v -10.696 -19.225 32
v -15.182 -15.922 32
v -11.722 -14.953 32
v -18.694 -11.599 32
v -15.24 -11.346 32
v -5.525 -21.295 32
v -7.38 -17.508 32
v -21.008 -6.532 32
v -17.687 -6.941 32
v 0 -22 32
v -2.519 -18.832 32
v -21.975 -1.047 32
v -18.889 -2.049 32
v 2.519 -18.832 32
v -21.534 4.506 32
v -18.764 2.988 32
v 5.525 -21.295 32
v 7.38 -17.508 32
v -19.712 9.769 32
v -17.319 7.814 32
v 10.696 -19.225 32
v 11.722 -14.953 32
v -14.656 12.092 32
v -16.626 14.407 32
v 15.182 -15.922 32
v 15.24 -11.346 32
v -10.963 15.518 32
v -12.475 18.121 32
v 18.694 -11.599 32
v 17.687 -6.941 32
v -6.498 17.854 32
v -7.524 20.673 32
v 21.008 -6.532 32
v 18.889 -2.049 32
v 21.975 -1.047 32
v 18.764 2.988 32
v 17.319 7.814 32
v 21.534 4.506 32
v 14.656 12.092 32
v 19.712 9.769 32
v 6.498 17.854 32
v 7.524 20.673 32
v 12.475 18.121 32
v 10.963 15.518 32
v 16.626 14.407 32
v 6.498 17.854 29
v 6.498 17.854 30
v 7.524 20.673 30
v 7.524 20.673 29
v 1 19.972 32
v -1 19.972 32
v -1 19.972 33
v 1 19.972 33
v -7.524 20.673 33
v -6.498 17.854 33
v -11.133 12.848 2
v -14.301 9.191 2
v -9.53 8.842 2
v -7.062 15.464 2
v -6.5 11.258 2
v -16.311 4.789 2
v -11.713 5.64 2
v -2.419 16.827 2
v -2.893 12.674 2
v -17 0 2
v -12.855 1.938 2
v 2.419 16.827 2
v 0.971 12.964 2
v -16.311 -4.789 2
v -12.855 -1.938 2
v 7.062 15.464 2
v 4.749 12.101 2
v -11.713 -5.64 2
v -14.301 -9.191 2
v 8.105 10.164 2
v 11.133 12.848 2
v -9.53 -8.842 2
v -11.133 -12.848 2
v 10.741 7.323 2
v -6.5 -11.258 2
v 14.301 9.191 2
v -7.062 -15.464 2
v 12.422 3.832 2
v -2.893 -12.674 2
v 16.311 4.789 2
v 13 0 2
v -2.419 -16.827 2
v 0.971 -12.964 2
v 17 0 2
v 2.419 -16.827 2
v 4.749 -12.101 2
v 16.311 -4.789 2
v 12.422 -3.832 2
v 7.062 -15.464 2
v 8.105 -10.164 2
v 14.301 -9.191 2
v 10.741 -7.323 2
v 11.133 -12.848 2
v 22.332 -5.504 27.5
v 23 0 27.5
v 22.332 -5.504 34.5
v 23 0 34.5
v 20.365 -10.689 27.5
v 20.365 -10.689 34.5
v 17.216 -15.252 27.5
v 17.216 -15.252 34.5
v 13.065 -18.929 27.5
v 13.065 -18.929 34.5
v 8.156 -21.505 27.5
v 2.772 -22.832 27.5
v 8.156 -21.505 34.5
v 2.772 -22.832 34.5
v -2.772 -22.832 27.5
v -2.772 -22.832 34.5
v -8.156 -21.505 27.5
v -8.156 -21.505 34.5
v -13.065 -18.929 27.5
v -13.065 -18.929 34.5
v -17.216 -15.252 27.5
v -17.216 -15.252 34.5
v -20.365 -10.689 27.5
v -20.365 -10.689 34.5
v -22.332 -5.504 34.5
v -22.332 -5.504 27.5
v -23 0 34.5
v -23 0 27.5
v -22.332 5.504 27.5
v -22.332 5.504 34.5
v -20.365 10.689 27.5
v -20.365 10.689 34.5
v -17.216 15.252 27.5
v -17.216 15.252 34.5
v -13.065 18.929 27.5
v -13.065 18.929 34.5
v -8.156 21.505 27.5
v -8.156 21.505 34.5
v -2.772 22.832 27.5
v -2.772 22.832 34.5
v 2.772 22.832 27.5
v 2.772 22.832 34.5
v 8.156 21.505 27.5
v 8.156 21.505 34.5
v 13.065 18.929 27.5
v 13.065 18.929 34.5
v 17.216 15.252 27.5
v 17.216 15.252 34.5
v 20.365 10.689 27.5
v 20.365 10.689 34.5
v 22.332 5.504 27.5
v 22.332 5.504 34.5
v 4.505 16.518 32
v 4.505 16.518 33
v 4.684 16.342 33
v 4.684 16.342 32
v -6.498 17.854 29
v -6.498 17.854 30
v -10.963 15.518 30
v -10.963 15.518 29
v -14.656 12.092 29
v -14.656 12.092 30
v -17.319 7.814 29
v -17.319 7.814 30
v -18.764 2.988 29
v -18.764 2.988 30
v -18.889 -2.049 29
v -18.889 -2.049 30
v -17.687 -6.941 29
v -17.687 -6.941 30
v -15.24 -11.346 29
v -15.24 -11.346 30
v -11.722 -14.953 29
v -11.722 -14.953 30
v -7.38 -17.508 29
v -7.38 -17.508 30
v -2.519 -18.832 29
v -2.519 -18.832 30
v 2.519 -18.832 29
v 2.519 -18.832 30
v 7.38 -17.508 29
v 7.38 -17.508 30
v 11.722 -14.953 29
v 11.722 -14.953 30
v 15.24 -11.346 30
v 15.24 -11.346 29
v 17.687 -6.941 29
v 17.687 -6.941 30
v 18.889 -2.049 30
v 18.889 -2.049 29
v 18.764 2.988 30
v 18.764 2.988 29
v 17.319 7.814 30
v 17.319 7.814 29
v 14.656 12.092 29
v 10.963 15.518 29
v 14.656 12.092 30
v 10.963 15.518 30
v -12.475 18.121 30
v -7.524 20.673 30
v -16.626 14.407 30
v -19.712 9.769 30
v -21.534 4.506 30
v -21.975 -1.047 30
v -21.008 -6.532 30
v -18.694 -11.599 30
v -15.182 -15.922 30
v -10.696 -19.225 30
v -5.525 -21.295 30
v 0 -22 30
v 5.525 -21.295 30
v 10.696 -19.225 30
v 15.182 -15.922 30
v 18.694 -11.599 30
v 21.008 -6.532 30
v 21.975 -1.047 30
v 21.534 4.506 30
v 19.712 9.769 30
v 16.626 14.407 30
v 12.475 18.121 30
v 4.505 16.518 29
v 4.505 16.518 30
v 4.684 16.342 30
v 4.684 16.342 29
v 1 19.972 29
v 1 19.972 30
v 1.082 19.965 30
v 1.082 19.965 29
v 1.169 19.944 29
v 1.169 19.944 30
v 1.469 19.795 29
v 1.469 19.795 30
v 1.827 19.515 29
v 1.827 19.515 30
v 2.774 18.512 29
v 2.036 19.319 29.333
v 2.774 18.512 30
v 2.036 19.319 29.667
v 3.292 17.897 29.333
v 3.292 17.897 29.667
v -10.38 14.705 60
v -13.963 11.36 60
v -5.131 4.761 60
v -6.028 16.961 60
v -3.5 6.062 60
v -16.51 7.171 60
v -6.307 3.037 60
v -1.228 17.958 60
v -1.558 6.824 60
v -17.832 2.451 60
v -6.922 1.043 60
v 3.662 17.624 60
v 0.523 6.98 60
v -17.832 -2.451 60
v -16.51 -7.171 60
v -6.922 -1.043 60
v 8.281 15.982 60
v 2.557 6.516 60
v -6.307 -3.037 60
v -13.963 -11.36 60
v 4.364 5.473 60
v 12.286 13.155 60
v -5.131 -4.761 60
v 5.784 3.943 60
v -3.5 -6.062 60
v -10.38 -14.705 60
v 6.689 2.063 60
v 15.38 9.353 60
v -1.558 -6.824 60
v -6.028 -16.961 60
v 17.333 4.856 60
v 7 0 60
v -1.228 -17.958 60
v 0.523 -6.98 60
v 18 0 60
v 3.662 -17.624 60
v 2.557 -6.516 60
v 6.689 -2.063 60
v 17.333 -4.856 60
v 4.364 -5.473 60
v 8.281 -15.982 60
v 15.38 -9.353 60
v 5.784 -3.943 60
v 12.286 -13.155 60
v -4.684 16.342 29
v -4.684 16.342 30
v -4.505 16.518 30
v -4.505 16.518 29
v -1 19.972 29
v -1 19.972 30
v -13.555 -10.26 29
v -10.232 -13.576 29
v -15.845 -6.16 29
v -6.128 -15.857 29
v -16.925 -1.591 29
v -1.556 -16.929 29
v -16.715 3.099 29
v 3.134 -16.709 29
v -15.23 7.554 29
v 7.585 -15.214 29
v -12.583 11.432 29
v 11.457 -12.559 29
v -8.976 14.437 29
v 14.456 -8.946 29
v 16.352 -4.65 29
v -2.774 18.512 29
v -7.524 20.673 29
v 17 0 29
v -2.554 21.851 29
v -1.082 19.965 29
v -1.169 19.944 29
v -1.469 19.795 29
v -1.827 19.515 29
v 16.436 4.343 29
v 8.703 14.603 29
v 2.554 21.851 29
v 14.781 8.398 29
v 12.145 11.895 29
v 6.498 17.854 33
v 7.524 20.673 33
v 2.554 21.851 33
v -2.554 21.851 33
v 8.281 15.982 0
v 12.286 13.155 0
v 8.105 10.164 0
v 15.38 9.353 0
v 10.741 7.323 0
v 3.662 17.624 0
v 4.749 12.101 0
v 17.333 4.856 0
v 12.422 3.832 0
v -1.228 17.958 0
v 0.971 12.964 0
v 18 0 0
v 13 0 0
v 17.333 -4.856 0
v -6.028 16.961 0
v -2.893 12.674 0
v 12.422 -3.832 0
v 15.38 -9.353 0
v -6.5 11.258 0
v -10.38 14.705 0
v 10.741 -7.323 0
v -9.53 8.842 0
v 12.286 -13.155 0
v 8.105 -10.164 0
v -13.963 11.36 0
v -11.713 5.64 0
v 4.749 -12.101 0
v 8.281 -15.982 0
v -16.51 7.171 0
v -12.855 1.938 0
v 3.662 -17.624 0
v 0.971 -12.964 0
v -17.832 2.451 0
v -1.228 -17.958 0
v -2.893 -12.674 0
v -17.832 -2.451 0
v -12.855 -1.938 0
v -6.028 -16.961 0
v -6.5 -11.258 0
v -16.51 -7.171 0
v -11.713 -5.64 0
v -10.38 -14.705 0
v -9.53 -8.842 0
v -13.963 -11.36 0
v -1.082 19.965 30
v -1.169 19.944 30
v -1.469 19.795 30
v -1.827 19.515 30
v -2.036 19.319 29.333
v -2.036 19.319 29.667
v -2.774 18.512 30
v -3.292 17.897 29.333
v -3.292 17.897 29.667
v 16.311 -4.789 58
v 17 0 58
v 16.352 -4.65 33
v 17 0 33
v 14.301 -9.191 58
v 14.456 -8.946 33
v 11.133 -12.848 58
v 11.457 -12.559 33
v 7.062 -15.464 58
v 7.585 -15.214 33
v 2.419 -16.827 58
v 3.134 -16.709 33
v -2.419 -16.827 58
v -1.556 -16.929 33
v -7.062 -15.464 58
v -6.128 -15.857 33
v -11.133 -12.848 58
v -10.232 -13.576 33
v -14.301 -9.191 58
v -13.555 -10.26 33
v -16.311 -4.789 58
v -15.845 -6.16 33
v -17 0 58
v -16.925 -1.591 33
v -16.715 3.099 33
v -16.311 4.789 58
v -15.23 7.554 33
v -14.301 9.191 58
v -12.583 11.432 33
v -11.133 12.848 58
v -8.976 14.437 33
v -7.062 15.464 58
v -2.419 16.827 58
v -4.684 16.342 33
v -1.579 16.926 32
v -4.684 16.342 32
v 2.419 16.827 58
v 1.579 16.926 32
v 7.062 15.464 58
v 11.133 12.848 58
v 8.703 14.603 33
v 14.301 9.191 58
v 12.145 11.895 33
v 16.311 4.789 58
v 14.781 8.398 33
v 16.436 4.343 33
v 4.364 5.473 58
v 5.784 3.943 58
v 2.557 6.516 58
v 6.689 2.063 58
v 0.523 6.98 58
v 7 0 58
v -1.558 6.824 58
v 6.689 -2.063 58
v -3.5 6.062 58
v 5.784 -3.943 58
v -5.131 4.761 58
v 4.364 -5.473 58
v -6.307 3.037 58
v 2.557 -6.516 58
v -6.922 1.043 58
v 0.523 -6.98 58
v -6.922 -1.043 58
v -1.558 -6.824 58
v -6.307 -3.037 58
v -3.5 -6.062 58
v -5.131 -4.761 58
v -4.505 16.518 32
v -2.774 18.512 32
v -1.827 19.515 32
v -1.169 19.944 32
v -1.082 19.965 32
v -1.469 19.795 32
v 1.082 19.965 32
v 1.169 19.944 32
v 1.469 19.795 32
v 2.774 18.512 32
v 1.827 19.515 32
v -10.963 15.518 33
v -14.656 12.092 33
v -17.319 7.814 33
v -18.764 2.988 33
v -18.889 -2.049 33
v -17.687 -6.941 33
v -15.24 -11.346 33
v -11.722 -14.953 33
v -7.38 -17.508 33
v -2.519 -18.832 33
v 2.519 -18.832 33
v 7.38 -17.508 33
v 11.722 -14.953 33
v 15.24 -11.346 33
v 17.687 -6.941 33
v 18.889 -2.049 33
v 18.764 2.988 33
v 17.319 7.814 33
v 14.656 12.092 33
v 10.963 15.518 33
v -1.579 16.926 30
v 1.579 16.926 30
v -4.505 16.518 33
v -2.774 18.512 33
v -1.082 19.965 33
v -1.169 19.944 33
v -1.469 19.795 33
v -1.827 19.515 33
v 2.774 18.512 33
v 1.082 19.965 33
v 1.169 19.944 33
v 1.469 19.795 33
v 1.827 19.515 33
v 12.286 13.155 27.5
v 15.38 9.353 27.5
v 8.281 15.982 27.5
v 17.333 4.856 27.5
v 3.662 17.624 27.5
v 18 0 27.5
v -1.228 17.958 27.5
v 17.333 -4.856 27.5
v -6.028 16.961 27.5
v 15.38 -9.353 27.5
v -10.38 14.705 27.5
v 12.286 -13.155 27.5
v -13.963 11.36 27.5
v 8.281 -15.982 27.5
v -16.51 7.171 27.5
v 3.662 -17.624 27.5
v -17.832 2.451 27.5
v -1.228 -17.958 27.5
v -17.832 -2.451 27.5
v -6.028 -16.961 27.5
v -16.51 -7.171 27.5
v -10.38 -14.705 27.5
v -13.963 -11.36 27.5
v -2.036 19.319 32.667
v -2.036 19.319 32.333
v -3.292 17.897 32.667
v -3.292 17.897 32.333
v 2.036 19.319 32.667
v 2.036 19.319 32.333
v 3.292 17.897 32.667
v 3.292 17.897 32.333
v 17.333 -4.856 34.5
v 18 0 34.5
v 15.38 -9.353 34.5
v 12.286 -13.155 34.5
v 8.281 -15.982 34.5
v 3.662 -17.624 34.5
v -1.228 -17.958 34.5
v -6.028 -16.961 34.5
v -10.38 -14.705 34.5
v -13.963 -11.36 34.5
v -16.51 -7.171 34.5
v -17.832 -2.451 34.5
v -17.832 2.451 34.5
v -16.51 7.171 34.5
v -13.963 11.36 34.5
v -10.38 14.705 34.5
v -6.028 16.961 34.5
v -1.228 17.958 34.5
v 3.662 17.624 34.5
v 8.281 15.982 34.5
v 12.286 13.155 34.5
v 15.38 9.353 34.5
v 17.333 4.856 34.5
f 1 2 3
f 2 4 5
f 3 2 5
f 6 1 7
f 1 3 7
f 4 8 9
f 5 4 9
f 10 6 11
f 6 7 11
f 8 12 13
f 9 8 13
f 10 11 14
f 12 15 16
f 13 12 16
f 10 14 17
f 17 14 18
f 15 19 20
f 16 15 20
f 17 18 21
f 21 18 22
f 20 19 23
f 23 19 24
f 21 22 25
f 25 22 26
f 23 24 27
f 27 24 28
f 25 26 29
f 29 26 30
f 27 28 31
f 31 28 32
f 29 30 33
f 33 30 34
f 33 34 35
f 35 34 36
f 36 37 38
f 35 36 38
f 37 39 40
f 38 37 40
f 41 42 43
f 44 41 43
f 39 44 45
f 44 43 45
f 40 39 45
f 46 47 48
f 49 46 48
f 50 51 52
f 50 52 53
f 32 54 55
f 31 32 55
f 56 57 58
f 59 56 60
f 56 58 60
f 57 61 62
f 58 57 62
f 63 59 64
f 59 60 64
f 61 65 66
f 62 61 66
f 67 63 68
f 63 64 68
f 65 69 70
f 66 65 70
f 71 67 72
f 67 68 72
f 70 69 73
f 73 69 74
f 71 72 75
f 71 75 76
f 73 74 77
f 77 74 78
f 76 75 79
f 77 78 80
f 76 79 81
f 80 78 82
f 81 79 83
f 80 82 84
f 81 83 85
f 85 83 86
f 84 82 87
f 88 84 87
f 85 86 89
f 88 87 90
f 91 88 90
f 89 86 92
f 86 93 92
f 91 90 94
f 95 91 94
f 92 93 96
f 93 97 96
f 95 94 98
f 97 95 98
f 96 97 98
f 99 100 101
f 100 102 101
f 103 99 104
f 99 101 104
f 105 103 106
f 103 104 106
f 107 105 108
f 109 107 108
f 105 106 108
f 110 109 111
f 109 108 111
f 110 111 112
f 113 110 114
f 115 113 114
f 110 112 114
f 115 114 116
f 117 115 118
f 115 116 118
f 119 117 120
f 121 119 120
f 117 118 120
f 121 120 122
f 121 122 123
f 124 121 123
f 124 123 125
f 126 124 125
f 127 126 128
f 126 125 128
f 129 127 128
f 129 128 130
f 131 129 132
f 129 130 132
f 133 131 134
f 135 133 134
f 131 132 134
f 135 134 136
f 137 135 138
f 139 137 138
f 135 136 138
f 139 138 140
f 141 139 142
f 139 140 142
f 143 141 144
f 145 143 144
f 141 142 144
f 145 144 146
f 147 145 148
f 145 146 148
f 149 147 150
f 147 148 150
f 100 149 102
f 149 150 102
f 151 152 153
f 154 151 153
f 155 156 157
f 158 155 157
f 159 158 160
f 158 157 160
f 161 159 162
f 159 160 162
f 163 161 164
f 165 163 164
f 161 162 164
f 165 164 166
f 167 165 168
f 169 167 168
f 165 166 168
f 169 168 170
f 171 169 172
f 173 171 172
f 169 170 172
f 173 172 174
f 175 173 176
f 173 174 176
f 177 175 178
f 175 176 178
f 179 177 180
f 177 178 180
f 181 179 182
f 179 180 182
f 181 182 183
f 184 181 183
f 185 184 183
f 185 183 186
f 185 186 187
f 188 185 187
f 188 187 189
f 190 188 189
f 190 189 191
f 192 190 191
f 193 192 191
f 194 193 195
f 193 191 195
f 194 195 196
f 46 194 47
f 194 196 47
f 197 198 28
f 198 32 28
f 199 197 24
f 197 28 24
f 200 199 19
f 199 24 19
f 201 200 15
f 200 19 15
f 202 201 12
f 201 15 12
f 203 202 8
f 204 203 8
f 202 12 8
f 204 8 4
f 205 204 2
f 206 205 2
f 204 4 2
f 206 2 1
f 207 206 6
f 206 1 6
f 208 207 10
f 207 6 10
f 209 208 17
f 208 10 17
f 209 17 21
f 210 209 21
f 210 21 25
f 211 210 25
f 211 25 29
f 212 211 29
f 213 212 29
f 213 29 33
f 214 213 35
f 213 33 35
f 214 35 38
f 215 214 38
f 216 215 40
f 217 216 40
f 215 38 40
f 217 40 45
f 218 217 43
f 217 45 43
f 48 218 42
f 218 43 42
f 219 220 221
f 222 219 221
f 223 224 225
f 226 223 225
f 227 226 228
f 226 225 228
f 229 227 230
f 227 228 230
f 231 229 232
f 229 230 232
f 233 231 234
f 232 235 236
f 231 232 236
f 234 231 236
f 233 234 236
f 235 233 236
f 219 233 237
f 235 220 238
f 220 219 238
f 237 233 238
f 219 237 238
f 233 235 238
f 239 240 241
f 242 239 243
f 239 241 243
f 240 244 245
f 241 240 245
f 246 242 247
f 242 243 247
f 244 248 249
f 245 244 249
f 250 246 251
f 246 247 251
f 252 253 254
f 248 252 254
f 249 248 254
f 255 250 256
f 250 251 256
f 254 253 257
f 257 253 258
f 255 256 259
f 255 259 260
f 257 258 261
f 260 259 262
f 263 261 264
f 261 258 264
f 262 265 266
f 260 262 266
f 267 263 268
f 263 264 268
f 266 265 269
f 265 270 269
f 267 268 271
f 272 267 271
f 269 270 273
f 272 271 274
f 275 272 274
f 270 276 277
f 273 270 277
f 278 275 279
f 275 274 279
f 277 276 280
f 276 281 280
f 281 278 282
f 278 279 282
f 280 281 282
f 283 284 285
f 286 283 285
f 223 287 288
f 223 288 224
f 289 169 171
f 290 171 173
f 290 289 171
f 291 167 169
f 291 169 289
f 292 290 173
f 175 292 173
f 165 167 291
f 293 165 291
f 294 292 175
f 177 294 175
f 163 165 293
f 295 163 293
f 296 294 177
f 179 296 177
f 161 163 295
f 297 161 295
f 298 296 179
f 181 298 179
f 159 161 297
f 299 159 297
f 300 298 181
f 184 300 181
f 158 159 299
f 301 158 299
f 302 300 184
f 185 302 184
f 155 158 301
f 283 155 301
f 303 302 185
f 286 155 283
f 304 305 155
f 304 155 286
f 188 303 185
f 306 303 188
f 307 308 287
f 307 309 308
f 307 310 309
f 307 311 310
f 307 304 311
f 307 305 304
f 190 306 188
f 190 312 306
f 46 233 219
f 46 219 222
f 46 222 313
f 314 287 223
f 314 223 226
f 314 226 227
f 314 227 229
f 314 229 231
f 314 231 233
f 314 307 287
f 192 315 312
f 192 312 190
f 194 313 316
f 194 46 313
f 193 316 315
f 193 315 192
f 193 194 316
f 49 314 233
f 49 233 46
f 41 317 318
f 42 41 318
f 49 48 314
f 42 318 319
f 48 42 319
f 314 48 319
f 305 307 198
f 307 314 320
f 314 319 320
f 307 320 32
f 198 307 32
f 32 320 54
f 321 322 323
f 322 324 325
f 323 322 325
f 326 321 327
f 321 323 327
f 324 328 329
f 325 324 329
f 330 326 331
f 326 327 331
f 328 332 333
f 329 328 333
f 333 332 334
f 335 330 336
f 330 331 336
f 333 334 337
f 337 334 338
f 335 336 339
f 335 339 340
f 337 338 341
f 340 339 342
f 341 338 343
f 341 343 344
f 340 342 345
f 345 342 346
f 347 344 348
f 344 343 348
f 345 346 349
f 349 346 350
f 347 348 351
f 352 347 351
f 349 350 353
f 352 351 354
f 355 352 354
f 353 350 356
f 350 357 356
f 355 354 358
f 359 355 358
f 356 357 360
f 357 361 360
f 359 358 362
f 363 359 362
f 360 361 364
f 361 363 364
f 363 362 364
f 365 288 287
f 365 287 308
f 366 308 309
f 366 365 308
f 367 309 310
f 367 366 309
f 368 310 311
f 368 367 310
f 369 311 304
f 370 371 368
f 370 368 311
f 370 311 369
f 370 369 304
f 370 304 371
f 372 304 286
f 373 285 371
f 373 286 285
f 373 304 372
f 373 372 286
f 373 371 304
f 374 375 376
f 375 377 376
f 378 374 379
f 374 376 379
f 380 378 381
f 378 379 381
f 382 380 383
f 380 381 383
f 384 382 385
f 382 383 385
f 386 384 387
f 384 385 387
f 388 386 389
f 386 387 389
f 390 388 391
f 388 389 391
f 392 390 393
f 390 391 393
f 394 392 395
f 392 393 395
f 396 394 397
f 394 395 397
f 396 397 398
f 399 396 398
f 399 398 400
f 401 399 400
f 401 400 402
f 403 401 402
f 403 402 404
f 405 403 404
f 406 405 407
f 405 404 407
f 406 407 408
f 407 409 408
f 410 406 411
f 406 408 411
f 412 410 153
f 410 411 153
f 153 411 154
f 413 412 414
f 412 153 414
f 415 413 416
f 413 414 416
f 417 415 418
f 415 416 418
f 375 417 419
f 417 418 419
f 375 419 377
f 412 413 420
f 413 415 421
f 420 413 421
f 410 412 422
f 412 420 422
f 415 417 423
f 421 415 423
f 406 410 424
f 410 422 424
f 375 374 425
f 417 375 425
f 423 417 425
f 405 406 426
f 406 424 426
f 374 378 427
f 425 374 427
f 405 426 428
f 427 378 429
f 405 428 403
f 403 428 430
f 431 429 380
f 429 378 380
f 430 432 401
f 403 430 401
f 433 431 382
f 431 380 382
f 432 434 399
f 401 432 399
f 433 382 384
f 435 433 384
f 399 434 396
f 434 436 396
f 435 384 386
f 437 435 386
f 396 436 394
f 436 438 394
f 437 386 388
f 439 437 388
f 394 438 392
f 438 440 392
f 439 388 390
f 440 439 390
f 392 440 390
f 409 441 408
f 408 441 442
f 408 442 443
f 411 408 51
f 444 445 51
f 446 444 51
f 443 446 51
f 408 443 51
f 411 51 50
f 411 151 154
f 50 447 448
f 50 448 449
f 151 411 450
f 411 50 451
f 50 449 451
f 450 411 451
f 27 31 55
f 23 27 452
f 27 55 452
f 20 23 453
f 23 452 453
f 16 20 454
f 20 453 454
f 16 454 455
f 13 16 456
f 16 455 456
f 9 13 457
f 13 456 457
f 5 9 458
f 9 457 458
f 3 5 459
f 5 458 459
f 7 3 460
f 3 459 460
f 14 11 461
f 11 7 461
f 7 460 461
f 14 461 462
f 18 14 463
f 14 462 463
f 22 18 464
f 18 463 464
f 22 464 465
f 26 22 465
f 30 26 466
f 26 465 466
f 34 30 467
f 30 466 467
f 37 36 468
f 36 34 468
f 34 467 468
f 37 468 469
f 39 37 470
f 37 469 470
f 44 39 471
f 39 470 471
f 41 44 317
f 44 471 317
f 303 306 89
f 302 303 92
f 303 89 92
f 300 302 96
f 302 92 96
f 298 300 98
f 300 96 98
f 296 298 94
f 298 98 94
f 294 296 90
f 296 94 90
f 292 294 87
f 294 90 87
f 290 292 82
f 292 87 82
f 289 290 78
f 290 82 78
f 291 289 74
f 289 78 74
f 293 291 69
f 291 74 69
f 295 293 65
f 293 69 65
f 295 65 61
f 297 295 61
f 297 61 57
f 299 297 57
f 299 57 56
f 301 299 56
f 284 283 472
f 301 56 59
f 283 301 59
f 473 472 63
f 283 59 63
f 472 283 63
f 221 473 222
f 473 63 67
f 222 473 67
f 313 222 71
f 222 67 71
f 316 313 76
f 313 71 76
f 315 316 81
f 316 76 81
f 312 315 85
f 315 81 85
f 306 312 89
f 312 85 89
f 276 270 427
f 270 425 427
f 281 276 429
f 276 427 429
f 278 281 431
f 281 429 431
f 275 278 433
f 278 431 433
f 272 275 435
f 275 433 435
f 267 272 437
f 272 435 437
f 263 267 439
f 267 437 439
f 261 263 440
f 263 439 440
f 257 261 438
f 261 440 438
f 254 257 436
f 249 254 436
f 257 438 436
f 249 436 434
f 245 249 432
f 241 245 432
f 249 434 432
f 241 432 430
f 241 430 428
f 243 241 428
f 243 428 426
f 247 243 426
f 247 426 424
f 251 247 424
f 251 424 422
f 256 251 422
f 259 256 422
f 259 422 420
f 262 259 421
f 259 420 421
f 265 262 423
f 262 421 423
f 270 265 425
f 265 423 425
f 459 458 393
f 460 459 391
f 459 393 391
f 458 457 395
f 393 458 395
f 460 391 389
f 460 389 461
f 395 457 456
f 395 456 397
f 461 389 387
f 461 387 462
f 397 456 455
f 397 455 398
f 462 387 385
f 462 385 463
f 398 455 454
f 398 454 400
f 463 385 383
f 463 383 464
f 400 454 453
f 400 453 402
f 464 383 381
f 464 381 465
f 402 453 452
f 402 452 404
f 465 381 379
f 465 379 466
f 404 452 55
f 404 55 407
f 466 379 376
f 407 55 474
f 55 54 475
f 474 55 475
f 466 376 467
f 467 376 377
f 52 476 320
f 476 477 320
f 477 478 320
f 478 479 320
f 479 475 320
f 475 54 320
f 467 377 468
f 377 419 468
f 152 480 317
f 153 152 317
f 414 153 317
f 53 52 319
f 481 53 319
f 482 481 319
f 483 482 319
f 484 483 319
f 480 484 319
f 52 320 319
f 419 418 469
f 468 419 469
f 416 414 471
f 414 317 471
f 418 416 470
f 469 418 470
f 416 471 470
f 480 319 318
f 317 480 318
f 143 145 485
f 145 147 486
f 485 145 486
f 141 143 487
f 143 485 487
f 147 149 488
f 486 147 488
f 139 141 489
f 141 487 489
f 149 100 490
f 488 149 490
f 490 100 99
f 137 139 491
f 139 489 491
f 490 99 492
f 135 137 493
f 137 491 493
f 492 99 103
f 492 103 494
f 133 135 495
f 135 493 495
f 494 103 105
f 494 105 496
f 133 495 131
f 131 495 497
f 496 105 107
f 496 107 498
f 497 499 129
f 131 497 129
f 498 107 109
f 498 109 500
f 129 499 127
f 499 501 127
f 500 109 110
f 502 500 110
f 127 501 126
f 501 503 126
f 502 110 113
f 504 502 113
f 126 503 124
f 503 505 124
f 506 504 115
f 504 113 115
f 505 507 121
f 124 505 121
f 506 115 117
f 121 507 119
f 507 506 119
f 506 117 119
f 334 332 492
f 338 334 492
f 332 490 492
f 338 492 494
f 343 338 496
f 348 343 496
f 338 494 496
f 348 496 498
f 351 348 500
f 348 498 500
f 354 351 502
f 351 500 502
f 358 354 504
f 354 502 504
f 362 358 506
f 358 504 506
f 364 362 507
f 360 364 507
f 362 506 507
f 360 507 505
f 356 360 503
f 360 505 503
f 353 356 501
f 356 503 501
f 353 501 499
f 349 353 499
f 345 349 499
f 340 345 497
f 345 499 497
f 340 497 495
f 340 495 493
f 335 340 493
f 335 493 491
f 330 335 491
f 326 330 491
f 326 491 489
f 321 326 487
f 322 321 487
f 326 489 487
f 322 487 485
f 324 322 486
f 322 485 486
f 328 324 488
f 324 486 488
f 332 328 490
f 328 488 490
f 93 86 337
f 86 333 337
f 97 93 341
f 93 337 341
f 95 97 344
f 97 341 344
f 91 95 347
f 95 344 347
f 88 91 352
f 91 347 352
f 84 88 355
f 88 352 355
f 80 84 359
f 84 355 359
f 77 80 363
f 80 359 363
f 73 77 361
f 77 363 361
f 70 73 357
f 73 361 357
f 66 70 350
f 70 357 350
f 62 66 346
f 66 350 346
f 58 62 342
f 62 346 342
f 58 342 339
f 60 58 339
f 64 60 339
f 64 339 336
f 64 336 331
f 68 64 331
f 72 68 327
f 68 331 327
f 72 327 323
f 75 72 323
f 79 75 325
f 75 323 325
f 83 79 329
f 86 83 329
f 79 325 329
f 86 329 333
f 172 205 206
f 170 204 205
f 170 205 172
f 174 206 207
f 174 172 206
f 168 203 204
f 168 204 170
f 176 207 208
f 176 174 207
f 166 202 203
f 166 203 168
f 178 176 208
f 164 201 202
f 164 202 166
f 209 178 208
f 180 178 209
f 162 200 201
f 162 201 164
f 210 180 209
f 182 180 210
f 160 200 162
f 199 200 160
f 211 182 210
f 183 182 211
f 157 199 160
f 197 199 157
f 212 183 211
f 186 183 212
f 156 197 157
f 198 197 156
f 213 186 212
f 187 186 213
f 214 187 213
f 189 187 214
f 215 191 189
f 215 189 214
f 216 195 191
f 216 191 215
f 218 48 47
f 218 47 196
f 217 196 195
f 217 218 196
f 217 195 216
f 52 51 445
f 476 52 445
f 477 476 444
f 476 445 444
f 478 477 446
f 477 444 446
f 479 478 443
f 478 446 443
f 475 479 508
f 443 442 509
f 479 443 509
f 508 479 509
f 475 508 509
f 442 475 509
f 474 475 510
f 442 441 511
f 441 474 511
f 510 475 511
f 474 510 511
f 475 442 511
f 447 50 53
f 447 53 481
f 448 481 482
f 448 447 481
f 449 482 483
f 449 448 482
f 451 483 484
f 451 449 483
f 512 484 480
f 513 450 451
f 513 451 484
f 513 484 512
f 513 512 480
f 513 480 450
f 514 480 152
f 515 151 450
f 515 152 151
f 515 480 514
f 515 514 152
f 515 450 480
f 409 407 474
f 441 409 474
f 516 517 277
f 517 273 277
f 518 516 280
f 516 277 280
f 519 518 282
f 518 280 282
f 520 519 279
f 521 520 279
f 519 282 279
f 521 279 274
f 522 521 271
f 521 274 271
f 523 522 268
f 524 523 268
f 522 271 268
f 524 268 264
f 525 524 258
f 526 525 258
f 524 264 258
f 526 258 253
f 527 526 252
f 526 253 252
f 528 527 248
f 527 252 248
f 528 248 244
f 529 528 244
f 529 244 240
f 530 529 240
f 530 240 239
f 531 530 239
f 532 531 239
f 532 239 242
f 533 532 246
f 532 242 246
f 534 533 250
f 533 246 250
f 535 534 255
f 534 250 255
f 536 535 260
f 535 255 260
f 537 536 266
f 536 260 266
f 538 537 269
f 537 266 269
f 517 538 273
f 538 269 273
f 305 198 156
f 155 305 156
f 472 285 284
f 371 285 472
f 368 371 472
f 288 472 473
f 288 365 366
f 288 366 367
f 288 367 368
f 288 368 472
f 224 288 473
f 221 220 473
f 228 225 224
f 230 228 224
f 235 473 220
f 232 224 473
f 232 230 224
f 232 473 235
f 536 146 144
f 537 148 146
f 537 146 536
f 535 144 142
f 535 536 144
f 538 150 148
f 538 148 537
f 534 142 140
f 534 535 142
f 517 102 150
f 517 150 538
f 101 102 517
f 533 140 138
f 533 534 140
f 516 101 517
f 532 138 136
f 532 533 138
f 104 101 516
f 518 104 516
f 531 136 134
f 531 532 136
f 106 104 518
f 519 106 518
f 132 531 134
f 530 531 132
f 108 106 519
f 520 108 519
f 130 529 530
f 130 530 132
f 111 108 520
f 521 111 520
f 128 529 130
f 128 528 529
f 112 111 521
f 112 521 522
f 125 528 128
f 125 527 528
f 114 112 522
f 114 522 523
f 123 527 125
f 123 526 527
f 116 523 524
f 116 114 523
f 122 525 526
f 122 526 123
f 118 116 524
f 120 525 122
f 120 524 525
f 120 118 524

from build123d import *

# Parameters (mm, degrees)
CUT_EXTRUDE1_DEPTH = 2
CUT_EXTRUDE2_DEPTH = 1


with BuildPart() as part:
    # Sketch1 → Revolve1 (revolve)
    with BuildSketch(Plane(origin=(0, 0, 0), x_dir=(0, 0, -1), z_dir=(1, 0, 0))):
        Polygon((-60, 18), (-60, 7), (-58, 7), (-58, 17), (-2, 17), (-2, 13), (0, 13), (0, 18), (-27.5, 18), (-27.5, 23), (-34.5, 23), (-34.5, 18), align=None)
    revolve(axis=Axis((0, 0, 1072.381477522), (0, 0, -1)))

    # Sketch3 → Cut-Extrude1 (cut, symmetric)
    with BuildSketch(Plane.XY.offset(31)):
        with BuildLine():
            ThreePointArc((-6.498382723, 17.854159795), (0, -19), (6.498382723, 17.854159795))
            Line((6.498382723, 17.854159795), (7.524443153, 20.673237657))
            ThreePointArc((7.524443153, 20.673237657), (0, 22), (-7.524443153, 20.673237657))
            Line((-7.524443153, 20.673237657), (-6.498382723, 17.854159795))
        make_face()
        with BuildLine():
            add(Edge.make_bspline(
                [(-1, 19.972475891), (-1.837517439, 19.972475891), (-3.400702548, 17.606617047), (-4.505243001, 16.51810785)],
                knots=[0, 0, 0, 0, 1, 1, 1, 1], degree=3))
            Line((-1, 19.972475891), (1, 19.972475891))
            add(Edge.make_bspline(
                [(1, 19.972475891), (1.837517439, 19.972475891), (3.400702548, 17.606617047), (4.505243001, 16.51810785)],
                knots=[0, 0, 0, 0, 1, 1, 1, 1], degree=3))
            Line((4.505243001, 16.51810785), (4.683957663, 16.341987046))
            ThreePointArc((4.683957663, 16.341987046), (13.576215973, 10.231635249), (17, 0))
            ThreePointArc((17, 0), (-10.231635249, -13.576215973), (-4.683957663, 16.341987046))
            Line((-4.683957663, 16.341987046), (-4.505243001, 16.51810785))
        make_face(mode=Mode.SUBTRACT)
    extrude(amount=CUT_EXTRUDE1_DEPTH, both=True, mode=Mode.SUBTRACT)

    # Sketch3<5> → Cut-Extrude2 (cut, symmetric)
    with BuildSketch(Plane.XY.offset(31)):
        with BuildLine():
            Line((1, 19.972475891), (-1, 19.972475891))
            add(Edge.make_bspline(
                [(-1, 19.972475891), (-1.837517439, 19.972475891), (-3.400702548, 17.606617047), (-4.505243001, 16.51810785)],
                knots=[0, 0, 0, 0, 1, 1, 1, 1], degree=3))
            Line((-4.505243001, 16.51810785), (-4.683957663, 16.341987046))
            ThreePointArc((-4.683957663, 16.341987046), (0, -17), (4.683957663, 16.341987046))
            Line((4.683957663, 16.341987046), (4.505243001, 16.51810785))
            add(Edge.make_bspline(
                [(1, 19.972475891), (1.837517439, 19.972475891), (3.400702548, 17.606617047), (4.505243001, 16.51810785)],
                knots=[0, 0, 0, 0, 1, 1, 1, 1], degree=3))
        make_face()
        with BuildLine():
            Line((7.524443153, 20.673237657), (6.498382723, 17.854159795))
            ThreePointArc((6.498382723, 17.854159795), (0, -19), (-6.498382723, 17.854159795))
            Line((-6.498382723, 17.854159795), (-7.524443153, 20.673237657))
            ThreePointArc((-7.524443153, 20.673237657), (0, -22), (7.524443153, 20.673237657))
        make_face()
    extrude(amount=CUT_EXTRUDE2_DEPTH, both=True, mode=Mode.SUBTRACT)


solid = part.part
